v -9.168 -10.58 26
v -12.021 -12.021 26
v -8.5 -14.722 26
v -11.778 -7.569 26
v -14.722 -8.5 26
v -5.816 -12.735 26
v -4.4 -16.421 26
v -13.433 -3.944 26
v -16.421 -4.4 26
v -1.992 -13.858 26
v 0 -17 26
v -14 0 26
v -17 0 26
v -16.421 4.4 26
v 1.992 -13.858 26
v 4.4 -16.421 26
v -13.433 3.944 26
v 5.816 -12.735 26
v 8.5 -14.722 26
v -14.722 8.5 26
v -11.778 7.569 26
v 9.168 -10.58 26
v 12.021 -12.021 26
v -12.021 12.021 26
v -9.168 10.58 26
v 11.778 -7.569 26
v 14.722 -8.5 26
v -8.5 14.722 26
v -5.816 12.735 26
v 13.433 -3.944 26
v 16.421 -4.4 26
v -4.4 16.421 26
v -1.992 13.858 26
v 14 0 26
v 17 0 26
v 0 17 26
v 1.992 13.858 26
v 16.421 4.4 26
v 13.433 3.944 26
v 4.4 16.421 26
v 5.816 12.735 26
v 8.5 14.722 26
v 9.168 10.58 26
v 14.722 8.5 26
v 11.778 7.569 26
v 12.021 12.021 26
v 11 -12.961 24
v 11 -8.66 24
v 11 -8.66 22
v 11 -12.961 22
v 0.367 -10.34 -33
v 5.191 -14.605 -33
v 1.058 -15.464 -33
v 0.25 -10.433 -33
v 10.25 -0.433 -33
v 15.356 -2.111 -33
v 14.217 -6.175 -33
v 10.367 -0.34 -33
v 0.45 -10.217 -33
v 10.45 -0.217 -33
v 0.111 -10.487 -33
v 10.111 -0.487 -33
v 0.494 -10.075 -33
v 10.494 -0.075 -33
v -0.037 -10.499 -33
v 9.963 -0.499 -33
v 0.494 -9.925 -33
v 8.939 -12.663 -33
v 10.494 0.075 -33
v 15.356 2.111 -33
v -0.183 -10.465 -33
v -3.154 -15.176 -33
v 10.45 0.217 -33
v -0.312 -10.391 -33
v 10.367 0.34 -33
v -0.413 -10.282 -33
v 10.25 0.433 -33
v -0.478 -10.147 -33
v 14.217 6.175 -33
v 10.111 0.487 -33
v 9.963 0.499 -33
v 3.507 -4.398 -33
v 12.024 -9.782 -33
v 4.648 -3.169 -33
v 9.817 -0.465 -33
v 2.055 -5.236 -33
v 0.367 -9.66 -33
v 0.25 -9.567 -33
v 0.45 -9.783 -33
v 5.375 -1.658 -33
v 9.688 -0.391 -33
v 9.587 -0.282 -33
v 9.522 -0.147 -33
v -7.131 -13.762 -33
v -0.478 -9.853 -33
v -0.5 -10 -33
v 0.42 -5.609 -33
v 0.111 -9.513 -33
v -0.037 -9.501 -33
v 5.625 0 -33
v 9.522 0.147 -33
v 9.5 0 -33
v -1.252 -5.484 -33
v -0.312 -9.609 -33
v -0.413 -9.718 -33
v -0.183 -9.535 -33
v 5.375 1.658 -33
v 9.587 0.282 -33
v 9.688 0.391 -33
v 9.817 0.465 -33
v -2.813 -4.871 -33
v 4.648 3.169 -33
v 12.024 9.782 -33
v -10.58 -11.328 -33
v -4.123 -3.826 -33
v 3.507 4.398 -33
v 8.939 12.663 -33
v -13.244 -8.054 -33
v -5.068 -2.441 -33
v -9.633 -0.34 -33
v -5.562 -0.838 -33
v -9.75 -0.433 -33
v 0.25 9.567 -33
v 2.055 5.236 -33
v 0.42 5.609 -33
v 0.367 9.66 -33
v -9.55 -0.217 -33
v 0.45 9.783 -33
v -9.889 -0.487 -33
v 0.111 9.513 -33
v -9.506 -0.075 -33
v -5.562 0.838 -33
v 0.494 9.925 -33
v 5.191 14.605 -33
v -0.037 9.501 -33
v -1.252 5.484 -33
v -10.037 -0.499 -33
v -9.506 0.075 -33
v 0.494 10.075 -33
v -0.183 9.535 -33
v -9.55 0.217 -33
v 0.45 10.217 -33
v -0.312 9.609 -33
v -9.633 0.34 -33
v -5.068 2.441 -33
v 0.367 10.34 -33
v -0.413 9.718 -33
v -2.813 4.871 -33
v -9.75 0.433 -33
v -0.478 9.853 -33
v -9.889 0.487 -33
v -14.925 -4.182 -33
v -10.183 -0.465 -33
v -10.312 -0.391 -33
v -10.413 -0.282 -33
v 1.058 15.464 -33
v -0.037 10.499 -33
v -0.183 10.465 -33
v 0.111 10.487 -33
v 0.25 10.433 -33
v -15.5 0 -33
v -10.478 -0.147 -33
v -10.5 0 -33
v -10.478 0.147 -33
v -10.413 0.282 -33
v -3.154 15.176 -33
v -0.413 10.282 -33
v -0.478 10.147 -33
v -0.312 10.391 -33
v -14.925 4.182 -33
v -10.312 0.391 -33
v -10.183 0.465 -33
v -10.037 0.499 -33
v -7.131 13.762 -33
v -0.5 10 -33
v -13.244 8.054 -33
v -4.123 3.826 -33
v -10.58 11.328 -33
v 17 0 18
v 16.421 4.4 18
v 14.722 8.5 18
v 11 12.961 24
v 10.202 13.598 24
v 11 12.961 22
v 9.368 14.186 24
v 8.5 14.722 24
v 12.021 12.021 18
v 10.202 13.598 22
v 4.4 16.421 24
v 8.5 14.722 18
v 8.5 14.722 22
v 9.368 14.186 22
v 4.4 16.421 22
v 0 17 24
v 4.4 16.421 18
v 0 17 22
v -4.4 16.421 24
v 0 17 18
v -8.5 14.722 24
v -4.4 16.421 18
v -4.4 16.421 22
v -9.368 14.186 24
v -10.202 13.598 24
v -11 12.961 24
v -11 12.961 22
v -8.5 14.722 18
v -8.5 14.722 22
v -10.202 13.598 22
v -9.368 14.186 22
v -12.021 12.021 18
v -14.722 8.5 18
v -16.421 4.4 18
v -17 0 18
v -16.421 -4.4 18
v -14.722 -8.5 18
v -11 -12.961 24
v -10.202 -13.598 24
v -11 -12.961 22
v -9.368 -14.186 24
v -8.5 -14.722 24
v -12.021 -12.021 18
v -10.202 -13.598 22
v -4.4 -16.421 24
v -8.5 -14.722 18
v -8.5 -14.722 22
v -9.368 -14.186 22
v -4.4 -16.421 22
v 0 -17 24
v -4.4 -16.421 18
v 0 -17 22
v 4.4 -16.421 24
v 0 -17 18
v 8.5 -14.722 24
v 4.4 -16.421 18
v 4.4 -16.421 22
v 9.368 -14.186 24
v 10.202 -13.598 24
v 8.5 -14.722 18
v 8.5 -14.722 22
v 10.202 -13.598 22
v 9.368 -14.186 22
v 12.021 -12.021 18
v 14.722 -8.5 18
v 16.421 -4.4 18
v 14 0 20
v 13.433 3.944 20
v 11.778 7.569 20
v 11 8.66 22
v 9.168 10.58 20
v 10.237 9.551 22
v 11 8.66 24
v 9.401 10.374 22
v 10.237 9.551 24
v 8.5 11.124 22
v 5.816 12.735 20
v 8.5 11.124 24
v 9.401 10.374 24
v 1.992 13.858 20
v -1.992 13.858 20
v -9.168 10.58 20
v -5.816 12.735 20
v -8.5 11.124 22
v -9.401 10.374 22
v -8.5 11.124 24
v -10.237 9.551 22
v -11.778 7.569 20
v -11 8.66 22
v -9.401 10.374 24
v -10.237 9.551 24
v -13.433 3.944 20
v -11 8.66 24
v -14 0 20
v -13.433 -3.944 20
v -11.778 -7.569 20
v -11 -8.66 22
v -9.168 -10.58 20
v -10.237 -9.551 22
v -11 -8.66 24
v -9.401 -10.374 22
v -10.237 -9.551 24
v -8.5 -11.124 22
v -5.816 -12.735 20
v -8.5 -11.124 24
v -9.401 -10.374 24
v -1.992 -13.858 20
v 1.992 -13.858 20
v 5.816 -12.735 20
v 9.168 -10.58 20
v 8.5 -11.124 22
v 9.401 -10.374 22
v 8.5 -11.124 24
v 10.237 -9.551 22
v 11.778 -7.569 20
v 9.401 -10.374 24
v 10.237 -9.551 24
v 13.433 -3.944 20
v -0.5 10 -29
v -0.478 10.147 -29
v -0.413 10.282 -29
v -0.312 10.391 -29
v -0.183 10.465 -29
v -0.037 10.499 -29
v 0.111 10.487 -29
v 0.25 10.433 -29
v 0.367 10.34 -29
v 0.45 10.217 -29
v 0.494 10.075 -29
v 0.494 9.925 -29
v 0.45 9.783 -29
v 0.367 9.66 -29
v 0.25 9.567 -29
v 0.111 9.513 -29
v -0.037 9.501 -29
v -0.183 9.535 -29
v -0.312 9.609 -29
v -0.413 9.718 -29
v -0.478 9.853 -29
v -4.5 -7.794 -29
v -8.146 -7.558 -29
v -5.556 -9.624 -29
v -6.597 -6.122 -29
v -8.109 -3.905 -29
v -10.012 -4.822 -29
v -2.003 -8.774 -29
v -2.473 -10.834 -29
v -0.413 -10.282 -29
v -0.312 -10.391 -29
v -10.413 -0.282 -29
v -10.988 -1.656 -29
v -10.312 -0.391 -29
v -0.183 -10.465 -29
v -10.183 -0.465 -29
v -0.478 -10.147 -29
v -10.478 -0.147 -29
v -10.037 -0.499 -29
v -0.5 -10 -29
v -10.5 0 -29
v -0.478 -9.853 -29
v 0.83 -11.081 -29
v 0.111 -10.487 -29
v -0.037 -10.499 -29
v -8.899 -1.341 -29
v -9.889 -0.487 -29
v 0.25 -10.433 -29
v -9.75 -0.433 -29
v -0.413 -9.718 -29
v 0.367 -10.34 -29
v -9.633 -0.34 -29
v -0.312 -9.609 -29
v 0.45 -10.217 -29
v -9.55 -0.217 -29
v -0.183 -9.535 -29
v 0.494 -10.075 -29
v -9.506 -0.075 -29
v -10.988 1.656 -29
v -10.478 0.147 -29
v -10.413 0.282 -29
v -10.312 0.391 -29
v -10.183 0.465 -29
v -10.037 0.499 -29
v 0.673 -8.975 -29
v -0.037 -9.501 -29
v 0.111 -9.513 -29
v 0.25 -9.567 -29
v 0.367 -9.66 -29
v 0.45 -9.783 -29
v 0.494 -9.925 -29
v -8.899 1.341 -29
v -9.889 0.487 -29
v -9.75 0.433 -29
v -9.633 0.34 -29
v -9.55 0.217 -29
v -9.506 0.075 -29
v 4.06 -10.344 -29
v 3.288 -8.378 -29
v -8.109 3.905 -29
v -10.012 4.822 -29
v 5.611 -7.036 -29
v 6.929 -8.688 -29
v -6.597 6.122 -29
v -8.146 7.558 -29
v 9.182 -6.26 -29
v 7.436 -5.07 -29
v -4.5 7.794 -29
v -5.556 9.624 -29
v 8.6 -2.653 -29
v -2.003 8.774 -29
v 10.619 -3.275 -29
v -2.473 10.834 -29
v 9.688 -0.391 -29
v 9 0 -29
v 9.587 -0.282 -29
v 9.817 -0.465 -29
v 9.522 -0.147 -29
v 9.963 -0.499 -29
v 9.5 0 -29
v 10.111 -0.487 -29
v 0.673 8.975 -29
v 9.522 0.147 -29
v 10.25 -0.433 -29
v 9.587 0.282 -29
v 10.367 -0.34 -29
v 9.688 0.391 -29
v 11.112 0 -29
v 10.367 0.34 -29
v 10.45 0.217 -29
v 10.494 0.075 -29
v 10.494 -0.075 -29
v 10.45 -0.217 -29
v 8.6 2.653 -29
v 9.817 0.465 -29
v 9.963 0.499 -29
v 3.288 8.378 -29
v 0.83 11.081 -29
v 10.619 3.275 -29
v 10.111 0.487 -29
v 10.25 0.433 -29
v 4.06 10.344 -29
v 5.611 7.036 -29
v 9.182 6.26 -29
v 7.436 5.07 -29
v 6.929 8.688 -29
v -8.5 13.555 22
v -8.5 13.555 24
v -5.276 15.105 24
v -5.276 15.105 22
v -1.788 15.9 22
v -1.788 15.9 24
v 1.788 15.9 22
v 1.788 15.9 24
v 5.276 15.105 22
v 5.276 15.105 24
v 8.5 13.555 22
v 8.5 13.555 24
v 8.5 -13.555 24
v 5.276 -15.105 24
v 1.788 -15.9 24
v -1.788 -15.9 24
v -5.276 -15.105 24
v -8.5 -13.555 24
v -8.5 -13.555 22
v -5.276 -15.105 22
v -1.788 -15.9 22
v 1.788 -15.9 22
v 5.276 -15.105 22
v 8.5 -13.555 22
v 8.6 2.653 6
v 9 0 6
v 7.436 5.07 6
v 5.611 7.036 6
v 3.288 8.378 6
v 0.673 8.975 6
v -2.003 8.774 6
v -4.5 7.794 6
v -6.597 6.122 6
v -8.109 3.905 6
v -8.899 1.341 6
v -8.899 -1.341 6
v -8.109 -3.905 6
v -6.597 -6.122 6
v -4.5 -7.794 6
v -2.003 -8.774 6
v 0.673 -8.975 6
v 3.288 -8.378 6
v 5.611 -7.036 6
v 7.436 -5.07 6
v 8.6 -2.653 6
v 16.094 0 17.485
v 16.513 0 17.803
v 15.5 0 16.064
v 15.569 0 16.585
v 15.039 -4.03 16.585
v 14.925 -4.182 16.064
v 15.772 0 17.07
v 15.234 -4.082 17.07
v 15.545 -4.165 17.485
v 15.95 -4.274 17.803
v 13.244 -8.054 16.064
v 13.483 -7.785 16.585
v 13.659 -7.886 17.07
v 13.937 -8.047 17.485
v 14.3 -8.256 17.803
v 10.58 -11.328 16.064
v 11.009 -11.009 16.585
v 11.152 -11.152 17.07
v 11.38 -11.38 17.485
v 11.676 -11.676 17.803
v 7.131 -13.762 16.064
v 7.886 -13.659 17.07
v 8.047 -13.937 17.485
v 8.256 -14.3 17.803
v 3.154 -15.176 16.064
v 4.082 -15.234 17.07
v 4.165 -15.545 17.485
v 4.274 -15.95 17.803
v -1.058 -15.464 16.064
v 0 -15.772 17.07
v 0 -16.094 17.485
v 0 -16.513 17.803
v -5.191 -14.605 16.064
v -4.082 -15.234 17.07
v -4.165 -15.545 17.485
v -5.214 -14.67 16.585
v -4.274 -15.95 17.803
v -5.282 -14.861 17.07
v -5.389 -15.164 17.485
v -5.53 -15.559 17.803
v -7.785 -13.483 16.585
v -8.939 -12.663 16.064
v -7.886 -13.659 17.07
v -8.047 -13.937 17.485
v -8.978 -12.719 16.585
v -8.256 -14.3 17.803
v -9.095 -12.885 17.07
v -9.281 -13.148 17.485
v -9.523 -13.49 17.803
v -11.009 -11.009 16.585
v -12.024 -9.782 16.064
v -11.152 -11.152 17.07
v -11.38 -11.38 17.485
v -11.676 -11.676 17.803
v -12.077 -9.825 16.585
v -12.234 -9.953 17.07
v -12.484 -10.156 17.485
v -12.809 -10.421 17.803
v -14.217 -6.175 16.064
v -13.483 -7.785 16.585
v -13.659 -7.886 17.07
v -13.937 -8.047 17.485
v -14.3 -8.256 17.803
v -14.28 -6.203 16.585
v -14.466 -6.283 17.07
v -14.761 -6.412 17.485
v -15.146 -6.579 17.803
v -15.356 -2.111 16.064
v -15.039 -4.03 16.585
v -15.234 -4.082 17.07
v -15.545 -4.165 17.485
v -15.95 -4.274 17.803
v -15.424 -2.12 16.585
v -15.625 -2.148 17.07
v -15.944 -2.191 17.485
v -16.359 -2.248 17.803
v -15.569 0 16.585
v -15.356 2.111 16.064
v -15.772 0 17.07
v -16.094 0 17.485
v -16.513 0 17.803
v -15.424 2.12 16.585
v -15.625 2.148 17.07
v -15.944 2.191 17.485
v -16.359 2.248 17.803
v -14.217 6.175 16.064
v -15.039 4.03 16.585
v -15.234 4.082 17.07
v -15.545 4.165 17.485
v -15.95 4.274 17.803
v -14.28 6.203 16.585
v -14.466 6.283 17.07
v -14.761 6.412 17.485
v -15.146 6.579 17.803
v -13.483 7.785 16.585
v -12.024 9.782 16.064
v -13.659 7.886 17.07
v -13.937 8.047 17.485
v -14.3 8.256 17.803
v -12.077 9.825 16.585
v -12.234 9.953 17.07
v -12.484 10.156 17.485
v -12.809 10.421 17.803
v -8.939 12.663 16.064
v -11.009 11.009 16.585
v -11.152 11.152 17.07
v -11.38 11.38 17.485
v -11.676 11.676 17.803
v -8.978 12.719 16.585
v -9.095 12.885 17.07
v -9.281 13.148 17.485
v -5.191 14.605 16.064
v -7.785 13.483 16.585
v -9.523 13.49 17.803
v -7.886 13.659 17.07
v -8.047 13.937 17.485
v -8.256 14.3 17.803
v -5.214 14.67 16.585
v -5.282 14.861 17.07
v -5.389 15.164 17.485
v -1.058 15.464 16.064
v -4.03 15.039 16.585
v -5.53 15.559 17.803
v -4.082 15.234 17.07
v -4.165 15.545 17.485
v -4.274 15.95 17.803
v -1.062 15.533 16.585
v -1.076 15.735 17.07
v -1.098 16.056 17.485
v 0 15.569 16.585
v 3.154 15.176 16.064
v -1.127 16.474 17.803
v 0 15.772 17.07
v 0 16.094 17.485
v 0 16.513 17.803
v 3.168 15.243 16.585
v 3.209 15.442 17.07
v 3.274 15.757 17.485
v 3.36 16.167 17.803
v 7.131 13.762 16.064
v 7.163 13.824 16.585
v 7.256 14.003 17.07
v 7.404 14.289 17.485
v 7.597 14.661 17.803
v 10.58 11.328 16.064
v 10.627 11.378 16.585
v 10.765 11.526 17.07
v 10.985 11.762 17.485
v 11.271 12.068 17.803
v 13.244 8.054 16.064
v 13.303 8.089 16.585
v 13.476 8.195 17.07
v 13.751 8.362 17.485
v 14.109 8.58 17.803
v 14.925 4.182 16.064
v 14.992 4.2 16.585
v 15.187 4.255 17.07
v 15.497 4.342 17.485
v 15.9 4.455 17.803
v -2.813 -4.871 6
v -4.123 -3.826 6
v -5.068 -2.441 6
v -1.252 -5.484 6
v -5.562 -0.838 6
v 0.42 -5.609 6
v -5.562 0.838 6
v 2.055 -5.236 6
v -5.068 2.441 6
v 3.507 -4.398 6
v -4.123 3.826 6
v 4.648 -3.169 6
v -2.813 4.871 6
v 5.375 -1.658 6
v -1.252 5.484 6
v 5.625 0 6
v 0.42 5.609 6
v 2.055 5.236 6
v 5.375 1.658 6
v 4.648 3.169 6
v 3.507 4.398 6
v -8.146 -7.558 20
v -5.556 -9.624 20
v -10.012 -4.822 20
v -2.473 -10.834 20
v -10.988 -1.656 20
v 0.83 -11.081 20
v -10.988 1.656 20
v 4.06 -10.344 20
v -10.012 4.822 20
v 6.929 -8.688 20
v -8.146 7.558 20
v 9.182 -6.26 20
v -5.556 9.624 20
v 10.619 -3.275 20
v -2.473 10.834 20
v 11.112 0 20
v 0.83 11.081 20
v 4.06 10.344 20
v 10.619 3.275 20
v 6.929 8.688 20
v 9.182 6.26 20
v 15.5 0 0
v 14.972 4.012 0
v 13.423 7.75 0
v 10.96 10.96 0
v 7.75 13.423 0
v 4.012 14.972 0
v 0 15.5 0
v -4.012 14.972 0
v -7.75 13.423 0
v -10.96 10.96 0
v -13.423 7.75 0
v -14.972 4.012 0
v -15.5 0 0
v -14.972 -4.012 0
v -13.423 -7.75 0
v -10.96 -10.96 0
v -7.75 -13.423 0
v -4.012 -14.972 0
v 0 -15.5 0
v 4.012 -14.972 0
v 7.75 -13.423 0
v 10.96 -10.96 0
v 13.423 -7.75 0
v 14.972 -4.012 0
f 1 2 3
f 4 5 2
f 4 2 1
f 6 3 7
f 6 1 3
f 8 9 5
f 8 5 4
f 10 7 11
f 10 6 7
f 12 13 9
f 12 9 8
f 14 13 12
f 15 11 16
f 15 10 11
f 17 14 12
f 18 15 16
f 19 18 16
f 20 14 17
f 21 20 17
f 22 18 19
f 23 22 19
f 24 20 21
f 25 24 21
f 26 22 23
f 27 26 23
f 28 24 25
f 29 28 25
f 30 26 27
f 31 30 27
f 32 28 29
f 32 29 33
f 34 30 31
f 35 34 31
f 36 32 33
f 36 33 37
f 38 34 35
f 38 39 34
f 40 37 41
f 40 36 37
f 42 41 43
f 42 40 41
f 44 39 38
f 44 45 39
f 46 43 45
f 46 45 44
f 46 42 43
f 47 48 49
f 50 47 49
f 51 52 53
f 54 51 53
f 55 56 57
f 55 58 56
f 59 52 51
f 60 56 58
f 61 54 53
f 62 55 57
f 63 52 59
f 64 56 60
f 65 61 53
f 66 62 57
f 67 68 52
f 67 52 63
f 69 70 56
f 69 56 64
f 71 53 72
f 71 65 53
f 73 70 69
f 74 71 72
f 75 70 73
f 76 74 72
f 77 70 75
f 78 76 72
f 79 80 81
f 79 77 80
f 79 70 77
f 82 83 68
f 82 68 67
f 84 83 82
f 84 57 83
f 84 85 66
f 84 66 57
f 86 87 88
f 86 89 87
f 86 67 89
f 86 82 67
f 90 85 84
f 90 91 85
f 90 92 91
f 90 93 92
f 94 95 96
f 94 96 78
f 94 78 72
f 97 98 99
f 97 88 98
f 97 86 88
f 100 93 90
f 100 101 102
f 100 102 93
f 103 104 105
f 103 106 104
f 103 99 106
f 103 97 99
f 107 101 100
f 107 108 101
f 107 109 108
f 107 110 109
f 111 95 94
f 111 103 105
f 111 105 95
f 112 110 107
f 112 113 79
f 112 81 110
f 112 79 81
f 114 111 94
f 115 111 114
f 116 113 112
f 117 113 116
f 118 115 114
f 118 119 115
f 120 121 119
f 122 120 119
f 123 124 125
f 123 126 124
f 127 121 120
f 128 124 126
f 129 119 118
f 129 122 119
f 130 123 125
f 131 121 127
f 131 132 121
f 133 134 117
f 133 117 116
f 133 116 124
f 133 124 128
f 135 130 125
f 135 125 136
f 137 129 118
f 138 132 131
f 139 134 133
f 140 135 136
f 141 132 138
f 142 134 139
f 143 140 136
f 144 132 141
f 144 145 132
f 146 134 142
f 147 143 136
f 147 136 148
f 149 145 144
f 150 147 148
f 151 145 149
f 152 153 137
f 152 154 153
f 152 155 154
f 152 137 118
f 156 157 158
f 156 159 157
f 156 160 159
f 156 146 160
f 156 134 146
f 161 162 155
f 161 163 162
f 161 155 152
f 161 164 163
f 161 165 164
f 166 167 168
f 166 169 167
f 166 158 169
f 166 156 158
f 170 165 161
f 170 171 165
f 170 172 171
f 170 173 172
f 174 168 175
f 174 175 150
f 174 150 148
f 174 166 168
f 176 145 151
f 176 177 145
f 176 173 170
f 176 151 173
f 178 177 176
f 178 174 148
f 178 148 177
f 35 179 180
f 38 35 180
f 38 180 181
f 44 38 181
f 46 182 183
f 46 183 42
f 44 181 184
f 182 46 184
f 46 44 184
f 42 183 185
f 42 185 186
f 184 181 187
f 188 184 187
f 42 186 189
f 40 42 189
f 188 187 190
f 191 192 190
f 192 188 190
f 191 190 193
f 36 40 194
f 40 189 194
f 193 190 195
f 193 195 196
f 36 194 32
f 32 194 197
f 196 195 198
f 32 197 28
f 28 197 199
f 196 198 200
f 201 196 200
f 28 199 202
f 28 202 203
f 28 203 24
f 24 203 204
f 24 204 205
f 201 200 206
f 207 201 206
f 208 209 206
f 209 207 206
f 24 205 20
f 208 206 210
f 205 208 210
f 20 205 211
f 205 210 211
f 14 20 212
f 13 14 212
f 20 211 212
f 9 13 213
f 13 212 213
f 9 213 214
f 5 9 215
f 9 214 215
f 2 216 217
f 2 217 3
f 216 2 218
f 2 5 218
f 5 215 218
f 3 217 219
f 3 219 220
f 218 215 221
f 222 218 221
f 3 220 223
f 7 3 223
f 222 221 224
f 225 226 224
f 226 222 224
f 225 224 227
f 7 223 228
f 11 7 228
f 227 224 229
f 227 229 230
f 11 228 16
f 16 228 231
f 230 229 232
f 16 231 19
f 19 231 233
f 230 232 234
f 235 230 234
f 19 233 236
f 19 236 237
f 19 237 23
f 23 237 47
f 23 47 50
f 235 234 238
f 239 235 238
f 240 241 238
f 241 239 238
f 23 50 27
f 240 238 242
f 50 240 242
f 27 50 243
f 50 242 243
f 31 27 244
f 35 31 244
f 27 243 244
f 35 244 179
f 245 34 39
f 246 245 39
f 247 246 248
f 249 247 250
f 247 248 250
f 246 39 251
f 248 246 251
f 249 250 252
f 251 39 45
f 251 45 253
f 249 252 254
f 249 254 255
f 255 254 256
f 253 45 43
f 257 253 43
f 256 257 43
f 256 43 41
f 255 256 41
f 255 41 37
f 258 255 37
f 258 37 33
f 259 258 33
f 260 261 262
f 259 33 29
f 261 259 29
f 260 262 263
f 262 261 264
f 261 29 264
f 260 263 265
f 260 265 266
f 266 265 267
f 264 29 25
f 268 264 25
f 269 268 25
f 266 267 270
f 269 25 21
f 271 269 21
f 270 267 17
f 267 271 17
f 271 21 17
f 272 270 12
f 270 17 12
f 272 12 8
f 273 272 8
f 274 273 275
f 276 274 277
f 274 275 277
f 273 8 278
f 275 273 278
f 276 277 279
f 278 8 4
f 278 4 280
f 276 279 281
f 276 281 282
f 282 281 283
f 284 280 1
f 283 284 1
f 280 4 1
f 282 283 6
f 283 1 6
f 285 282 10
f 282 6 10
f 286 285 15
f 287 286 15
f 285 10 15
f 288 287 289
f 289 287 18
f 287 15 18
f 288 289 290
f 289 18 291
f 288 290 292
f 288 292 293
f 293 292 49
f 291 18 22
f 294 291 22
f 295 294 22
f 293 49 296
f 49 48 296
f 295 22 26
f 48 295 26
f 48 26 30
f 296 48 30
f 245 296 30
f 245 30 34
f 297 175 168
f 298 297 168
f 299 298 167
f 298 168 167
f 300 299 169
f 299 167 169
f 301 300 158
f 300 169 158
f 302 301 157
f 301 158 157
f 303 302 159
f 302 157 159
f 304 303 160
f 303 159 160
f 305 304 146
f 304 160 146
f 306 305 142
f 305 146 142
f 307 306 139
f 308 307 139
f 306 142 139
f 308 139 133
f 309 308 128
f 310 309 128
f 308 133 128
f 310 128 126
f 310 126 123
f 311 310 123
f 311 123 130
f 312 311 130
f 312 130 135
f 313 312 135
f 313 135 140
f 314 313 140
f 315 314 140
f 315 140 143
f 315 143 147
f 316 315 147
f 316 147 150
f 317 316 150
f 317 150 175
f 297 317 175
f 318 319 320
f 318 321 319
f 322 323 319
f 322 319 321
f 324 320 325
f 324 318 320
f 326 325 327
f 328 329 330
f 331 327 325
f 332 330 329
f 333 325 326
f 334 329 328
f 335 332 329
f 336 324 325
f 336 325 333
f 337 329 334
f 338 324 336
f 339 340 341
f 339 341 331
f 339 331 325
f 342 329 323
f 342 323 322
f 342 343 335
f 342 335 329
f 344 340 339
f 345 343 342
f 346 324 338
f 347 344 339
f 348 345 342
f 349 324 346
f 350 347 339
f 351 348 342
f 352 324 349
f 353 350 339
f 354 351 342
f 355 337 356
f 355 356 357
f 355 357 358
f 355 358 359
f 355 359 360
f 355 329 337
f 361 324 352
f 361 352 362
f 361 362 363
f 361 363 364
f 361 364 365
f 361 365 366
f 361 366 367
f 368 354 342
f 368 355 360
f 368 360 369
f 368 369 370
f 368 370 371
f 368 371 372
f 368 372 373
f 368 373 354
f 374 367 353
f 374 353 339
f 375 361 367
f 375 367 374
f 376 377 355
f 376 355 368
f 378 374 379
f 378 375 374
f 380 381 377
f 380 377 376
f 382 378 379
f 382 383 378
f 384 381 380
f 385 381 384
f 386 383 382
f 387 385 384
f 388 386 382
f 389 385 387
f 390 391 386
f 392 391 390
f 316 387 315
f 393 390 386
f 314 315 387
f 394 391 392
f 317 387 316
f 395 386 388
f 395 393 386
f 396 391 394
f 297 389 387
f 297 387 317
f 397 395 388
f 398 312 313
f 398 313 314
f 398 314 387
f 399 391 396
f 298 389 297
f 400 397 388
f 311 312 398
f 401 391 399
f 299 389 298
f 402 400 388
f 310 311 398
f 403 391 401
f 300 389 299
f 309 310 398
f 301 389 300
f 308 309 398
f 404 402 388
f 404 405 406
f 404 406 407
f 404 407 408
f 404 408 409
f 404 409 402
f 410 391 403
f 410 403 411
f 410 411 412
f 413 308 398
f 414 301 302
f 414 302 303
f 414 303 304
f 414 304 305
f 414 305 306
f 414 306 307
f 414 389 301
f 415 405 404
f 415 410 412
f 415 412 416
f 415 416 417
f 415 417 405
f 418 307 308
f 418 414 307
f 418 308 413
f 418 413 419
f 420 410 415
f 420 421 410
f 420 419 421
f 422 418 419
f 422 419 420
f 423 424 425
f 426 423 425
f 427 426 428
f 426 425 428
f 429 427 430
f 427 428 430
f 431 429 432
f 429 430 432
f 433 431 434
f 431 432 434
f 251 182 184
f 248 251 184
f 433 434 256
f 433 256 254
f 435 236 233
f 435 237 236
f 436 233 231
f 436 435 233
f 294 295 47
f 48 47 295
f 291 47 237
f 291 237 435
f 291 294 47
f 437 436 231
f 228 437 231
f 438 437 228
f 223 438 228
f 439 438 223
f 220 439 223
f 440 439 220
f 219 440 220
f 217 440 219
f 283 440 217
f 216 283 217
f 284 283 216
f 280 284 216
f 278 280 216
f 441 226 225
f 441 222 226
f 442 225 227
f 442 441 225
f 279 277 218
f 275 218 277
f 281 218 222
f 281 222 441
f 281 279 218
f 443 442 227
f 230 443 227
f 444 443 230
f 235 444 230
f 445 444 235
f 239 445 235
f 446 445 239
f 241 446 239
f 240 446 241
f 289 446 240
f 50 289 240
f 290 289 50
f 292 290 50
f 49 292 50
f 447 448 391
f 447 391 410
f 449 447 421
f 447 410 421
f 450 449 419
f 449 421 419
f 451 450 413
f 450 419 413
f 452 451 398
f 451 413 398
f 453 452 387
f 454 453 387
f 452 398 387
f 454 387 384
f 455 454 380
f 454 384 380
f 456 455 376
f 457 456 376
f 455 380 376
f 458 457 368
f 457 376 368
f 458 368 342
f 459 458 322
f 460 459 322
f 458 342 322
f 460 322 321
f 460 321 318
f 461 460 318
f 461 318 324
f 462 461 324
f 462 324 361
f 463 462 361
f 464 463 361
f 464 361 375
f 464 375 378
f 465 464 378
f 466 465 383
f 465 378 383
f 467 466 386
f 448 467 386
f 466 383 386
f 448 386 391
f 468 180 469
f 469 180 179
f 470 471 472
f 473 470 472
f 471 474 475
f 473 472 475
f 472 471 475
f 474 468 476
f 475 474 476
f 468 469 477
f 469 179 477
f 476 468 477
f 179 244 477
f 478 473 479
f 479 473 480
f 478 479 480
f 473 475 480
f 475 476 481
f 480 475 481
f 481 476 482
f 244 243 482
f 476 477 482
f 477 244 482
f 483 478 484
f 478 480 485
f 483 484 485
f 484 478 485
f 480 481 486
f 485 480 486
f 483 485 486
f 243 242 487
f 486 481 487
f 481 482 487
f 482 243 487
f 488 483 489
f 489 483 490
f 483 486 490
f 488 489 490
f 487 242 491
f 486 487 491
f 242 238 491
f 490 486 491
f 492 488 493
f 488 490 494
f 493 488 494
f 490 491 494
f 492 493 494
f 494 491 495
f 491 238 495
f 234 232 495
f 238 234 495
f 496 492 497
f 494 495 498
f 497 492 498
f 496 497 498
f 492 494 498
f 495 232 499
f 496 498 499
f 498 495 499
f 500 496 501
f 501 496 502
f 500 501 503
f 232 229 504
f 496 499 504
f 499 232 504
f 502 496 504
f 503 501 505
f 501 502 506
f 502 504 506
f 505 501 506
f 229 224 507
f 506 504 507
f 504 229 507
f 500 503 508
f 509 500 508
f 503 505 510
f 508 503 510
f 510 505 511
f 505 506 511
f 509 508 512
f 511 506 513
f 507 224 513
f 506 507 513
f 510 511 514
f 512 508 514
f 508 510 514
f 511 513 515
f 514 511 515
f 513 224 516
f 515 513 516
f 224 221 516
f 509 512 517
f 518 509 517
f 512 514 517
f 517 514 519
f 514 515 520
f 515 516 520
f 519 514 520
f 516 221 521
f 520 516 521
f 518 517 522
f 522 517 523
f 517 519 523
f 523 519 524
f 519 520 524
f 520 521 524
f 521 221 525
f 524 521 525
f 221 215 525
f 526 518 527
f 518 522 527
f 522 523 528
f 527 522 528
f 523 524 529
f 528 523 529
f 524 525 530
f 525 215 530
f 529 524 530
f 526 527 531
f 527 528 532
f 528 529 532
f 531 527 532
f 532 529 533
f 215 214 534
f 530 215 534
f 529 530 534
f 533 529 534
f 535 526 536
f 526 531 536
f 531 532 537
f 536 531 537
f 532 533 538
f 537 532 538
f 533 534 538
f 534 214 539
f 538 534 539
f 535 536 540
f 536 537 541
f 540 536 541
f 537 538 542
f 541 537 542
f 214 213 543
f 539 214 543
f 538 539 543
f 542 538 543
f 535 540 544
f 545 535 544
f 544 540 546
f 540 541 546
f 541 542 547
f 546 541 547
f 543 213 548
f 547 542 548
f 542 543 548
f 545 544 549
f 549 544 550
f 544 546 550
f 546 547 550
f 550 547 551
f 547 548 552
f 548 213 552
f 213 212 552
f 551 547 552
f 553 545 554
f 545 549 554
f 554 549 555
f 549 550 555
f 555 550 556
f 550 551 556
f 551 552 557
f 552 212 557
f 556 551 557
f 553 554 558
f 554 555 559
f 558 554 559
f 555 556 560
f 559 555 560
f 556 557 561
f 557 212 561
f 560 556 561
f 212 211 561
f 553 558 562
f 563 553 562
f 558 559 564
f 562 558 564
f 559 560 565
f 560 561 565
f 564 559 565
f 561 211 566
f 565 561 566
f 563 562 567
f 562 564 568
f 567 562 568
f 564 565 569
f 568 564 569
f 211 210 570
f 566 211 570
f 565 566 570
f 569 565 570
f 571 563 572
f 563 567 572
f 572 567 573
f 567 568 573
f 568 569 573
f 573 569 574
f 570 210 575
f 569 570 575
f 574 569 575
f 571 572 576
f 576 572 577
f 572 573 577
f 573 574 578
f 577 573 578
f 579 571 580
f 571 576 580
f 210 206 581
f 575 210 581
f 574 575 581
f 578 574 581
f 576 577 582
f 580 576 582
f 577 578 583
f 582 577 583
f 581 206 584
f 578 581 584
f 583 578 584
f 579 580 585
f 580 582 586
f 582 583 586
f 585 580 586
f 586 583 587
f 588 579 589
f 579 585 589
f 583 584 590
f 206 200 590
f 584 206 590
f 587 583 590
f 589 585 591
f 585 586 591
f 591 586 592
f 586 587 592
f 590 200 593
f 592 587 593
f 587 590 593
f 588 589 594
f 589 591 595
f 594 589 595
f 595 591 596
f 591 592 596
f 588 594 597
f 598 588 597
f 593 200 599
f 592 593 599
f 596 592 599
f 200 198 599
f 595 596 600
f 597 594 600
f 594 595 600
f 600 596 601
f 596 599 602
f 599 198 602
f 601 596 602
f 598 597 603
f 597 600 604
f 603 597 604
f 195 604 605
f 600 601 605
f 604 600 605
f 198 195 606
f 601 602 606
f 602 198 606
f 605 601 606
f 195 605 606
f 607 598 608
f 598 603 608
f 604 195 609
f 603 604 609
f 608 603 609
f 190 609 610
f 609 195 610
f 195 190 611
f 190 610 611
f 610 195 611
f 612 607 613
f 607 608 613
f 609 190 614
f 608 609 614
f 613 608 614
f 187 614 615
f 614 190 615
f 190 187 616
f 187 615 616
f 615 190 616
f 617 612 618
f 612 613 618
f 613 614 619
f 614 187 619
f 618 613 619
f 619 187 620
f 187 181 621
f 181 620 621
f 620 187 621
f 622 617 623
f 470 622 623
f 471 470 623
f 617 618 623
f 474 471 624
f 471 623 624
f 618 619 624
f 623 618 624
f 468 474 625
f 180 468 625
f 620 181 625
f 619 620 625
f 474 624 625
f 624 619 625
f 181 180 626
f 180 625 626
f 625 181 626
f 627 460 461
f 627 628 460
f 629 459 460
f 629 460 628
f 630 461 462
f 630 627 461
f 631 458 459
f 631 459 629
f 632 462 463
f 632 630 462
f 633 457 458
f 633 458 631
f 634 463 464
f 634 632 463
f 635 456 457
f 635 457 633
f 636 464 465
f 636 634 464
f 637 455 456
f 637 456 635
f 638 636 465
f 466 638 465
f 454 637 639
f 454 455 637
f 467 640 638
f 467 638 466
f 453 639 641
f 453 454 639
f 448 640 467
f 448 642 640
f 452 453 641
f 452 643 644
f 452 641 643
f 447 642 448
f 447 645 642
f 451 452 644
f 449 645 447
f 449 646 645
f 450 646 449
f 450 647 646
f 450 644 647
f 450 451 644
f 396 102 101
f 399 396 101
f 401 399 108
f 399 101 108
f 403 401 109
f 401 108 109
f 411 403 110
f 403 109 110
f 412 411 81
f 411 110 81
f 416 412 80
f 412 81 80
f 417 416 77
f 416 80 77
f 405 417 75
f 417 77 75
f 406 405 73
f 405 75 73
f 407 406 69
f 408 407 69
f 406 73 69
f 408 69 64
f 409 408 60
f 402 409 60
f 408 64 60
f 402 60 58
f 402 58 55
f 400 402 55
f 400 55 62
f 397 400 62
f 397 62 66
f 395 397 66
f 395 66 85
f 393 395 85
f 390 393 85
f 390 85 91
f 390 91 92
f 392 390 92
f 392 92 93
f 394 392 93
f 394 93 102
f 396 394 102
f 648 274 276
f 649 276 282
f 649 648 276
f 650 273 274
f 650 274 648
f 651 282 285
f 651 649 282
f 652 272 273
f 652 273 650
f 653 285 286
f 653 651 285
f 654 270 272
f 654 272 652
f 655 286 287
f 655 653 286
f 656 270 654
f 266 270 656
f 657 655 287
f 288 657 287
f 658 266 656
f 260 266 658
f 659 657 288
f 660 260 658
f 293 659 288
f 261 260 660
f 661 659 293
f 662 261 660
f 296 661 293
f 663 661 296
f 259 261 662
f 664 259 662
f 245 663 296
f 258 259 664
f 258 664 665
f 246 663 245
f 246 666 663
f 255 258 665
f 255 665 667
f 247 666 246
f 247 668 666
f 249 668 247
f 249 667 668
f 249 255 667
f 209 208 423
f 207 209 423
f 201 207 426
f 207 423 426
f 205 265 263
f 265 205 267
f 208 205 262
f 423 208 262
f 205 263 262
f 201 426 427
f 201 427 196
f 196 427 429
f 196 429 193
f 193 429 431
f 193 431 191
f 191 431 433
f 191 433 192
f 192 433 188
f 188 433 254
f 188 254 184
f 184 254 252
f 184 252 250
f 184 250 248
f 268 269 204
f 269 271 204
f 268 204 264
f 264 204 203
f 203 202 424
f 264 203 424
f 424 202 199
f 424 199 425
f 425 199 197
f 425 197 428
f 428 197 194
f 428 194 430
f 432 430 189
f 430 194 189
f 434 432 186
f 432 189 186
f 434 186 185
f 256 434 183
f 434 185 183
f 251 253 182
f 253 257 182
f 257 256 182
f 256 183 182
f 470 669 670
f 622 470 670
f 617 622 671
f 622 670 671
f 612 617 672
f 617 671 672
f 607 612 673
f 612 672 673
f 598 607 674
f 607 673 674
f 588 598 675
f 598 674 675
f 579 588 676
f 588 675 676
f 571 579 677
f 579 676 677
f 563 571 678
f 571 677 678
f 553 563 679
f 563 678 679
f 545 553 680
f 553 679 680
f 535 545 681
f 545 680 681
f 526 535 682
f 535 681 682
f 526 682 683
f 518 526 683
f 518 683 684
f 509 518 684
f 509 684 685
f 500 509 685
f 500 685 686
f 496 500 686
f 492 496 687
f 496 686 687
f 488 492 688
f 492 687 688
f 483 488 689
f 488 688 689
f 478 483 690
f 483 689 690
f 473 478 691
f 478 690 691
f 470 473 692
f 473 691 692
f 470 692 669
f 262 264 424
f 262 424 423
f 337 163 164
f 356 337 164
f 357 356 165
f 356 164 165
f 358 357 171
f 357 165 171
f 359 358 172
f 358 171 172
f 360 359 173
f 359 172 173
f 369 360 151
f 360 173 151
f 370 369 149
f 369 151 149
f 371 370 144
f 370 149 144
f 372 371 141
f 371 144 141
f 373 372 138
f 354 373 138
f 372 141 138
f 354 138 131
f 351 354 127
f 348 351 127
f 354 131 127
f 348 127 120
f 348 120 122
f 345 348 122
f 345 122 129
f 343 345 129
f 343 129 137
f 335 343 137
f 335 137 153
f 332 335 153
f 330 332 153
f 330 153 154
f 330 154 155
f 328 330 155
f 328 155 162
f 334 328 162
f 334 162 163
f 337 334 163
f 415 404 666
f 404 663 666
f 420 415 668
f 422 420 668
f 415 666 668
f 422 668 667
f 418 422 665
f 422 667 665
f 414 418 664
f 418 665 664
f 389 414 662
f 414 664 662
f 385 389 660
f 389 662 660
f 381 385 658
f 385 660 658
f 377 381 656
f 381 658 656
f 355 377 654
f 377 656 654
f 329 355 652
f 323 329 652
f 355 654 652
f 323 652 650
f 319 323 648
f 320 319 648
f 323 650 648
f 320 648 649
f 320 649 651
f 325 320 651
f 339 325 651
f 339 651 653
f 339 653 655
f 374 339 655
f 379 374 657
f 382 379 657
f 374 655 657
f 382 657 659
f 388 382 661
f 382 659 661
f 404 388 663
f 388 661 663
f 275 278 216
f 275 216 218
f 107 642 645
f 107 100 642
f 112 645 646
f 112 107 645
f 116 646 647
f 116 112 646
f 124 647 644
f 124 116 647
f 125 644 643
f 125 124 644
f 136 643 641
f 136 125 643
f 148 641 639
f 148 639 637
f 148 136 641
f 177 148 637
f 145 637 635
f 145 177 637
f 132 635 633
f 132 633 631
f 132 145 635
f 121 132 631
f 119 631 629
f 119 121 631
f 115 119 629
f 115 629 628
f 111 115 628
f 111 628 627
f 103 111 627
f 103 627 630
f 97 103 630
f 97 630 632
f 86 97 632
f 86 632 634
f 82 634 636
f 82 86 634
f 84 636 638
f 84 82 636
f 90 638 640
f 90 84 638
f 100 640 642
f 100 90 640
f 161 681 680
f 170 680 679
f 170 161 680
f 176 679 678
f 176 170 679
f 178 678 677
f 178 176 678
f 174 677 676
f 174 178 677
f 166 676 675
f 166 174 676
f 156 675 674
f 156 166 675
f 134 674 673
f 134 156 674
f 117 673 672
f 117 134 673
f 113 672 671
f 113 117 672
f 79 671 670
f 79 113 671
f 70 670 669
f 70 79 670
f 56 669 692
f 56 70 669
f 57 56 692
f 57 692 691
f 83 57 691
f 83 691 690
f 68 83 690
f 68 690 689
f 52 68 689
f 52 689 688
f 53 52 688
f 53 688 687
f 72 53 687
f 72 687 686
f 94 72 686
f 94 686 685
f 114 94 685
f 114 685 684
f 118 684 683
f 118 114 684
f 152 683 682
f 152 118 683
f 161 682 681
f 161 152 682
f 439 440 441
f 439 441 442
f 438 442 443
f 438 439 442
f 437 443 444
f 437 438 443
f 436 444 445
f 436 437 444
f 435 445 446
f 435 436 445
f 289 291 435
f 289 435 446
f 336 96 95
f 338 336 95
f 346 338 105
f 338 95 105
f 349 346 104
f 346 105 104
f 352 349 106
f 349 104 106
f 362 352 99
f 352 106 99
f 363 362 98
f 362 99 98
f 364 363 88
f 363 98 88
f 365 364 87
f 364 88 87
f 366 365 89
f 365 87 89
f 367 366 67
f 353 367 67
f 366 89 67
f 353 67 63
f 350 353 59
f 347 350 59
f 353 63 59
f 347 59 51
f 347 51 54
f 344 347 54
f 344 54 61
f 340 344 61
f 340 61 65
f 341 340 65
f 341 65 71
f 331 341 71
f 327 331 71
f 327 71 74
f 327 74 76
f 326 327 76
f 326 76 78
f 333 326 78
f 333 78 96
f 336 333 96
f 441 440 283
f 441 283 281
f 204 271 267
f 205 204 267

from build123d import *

# Parameters (mm, degrees)
SKETCH1_R                = 15.5
BOSS_EXTRUDE5_DEPTH      = 26
SKETCH3_R                = 5.625
CUT_EXTRUDE2_DEPTH       = 35.007352146
CUT_EXTRUDE3_DEPTH       = 28
CUT_EXTRUDE3_DEPTH_BACK  = 20
SKETCH4_R                = 11.1125
CUT_EXTRUDE6_START       = 6
SKETCH7_R                = 11
SKETCH7_R_2              = 9
CUT_EXTRUDE6_DEPTH       = 2
BOSS_EXTRUDE8_DEPTH      = 6
BOSS_EXTRUDE8_DEPTH_BACK = 2
BOSS_EXTRUDE8_START      = 20
SKETCH12_R               = 17
CUT_EXTRUDE10_START      = 18
SKETCH13_R               = 11
CUT_EXTRUDE10_DEPTH      = 18.411862419
FILLET2_R                = 2
CUT_EXTRUDE11_START      = 26
SKETCH14_R               = 14
CUT_EXTRUDE11_DEPTH      = 6
SKETCH15_R               = 0.5
CUT_EXTRUDE14_DEPTH      = 36.411862419
SKETCH18_W               = 2.5
SKETCH18_H               = 2
CUT_EXTRUDE15_DEPTH      = 20
CUT_EXTRUDE16_DEPTH      = 2
BOSS_EXTRUDE9_START      = 33
SKETCH26_R               = 15.5
SKETCH26_R_2             = 5.625
SKETCH26_R_3             = 0.5
BOSS_EXTRUDE9_DEPTH      = 33
SKETCH27_R               = 11.1125
CUT_EXTRUDE17_DEPTH      = 33
BOSS_EXTRUDE10_START     = -35
SKETCH24_R               = 9
SKETCH24_R_2             = 5.625
BOSS_EXTRUDE10_DEPTH     = 35


with BuildPart() as part:
    # Sketch1 → Boss-Extrude5 (new body)
    with BuildSketch(Plane.XY):
        Circle(SKETCH1_R)
    extrude(amount=BOSS_EXTRUDE5_DEPTH)

    # Sketch3 → Cut-Extrude2 (cut, through all)
    with BuildSketch(Plane.XY.offset(26)):
        Circle(SKETCH3_R)
    extrude(amount=-CUT_EXTRUDE2_DEPTH, mode=Mode.SUBTRACT)

    # Sketch4 → Cut-Extrude3 (cut, two sides: drawn at the far end of the back side and taken through both)
    with BuildSketch(Plane.XY.offset(26).offset(-CUT_EXTRUDE3_DEPTH_BACK)):
        Circle(SKETCH4_R)
    extrude(amount=CUT_EXTRUDE3_DEPTH + CUT_EXTRUDE3_DEPTH_BACK, mode=Mode.SUBTRACT)

    # Sketch7 → Cut-Extrude6 (cut)
    with BuildSketch(Plane.XY.offset(CUT_EXTRUDE6_START)):
        Circle(SKETCH7_R)
        Circle(SKETCH7_R_2, mode=Mode.SUBTRACT)
    extrude(amount=-CUT_EXTRUDE6_DEPTH, mode=Mode.SUBTRACT)

    # Sketch12 → Boss-Extrude8 (add, two sides: drawn at the far end of the back side and taken through both)
    with BuildSketch(Plane.XY.offset(BOSS_EXTRUDE8_START - BOSS_EXTRUDE8_DEPTH_BACK)):
        Circle(SKETCH12_R)
    extrude(amount=BOSS_EXTRUDE8_DEPTH + BOSS_EXTRUDE8_DEPTH_BACK)

    # Sketch13 → Cut-Extrude10 (cut, through all)
    with BuildSketch(Plane.XY.offset(CUT_EXTRUDE10_START)):
        Circle(SKETCH13_R)
    extrude(amount=CUT_EXTRUDE10_DEPTH, mode=Mode.SUBTRACT)

    # Fillet2
    # the kernel refuses this fillet: 2 mm, written as the material it adds along each edge
    with BuildSketch(Plane(origin=(0, 0, 18), x_dir=(1, 0, 0), z_dir=(0, 1, 0))) as fillet2_piece_1:
        with BuildLine():
            CenterArc((17.5, 1.936491673), FILLET2_R, 180, 75.522487814)
            Line((17, 0), (16.99, -0.038729833))
            ThreePointArc((16.99, -0.038729833), (16.25, -0.04), (15.5, -0.04))
            Line((15.5, -0.04), (15.46, 0))
            Line((15.46, 0), (15.46, 1.936491673))
            Line((15.46, 1.936491673), (15.5, 1.936491673))
        make_face()
    revolve(axis=Axis((0, 0, 18), (0, 0, -1)))

    # Sketch14 → Cut-Extrude11 (cut)
    with BuildSketch(Plane.XY.offset(CUT_EXTRUDE11_START)):
        Circle(SKETCH14_R)
    extrude(amount=-CUT_EXTRUDE11_DEPTH, mode=Mode.SUBTRACT)

    # Sketch15 → Cut-Extrude14 (cut, through all)
    with BuildSketch(Plane.XY):
        with Locations((0, 10)):
            Circle(SKETCH15_R)
        with Locations((0, -10)):
            Circle(SKETCH15_R)
        with Locations((10, 0)):
            Circle(SKETCH15_R)
        with Locations((-10, 0)):
            Circle(SKETCH15_R)
    extrude(amount=CUT_EXTRUDE14_DEPTH, mode=Mode.SUBTRACT)

    # Sketch18 → Cut-Extrude15 (cut, symmetric)
    with BuildSketch(Plane(origin=(0, 0, 0), x_dir=(1, 0, 0), z_dir=(0, 1, 0))):
        with Locations((-9.75, -23)):
            Rectangle(SKETCH18_W, SKETCH18_H)
        with Locations((9.75, -23)):
            Rectangle(SKETCH18_W, SKETCH18_H)
    extrude(amount=CUT_EXTRUDE15_DEPTH, both=True, mode=Mode.SUBTRACT)

    # Sketch23 → Cut-Extrude16 (cut)
    with BuildSketch(Plane(origin=(0, 0, 24), x_dir=(-1, 0, 0), z_dir=(0, 0, -1))):
        with BuildLine():
            Line((9.719197711, 13.947659153), (9.147480199, 13.127208615))
            ThreePointArc((9.147480199, 13.127208615), (0, 16), (-9.147480199, 13.127208615))
            Line((-9.147480199, 13.127208615), (-9.719197711, 13.947659153))
            ThreePointArc((-9.719197711, 13.947659153), (0, 17), (9.719197711, 13.947659153))
        make_face()
        with BuildLine():
            Line((-9.147480199, -13.127208615), (-9.719197711, -13.947659153))
            ThreePointArc((-9.719197711, -13.947659153), (0, -17), (9.719197711, -13.947659153))
            Line((9.719197711, -13.947659153), (9.147480199, -13.127208615))
            ThreePointArc((9.147480199, -13.127208615), (0, -16), (-9.147480199, -13.127208615))
        make_face()
    extrude(amount=CUT_EXTRUDE16_DEPTH, mode=Mode.SUBTRACT)

    # Sketch26 → Boss-Extrude9 (add)
    with BuildSketch(Plane(origin=(0, 0, 0), x_dir=(-1, 0, 0), z_dir=(0, 0, -1)).offset(BOSS_EXTRUDE9_START)):
        Circle(SKETCH26_R)
        with Locations(Location((0, 0, 0), (0, 0, 180))):
            Circle(SKETCH26_R_2, mode=Mode.SUBTRACT)
        with Locations((-10, 0)):
            Circle(SKETCH26_R_3, mode=Mode.SUBTRACT)
        with Locations((0, 10)):
            Circle(SKETCH26_R_3, mode=Mode.SUBTRACT)
        with Locations((10, 0)):
            Circle(SKETCH26_R_3, mode=Mode.SUBTRACT)
        with Locations((0, -10)):
            Circle(SKETCH26_R_3, mode=Mode.SUBTRACT)
    extrude(amount=-BOSS_EXTRUDE9_DEPTH)

    # Sketch27 → Cut-Extrude17 (cut, symmetric)
    with BuildSketch(Plane.XY.offset(4)):
        Circle(SKETCH27_R)
    extrude(amount=CUT_EXTRUDE17_DEPTH, both=True, mode=Mode.SUBTRACT)

    # Sketch24 → Boss-Extrude10 (add)
    with BuildSketch(Plane.XY.offset(6).offset(BOSS_EXTRUDE10_START)):
        Circle(SKETCH24_R)
        Circle(SKETCH24_R_2, mode=Mode.SUBTRACT)
    extrude(amount=BOSS_EXTRUDE10_DEPTH)


solid = part.part
